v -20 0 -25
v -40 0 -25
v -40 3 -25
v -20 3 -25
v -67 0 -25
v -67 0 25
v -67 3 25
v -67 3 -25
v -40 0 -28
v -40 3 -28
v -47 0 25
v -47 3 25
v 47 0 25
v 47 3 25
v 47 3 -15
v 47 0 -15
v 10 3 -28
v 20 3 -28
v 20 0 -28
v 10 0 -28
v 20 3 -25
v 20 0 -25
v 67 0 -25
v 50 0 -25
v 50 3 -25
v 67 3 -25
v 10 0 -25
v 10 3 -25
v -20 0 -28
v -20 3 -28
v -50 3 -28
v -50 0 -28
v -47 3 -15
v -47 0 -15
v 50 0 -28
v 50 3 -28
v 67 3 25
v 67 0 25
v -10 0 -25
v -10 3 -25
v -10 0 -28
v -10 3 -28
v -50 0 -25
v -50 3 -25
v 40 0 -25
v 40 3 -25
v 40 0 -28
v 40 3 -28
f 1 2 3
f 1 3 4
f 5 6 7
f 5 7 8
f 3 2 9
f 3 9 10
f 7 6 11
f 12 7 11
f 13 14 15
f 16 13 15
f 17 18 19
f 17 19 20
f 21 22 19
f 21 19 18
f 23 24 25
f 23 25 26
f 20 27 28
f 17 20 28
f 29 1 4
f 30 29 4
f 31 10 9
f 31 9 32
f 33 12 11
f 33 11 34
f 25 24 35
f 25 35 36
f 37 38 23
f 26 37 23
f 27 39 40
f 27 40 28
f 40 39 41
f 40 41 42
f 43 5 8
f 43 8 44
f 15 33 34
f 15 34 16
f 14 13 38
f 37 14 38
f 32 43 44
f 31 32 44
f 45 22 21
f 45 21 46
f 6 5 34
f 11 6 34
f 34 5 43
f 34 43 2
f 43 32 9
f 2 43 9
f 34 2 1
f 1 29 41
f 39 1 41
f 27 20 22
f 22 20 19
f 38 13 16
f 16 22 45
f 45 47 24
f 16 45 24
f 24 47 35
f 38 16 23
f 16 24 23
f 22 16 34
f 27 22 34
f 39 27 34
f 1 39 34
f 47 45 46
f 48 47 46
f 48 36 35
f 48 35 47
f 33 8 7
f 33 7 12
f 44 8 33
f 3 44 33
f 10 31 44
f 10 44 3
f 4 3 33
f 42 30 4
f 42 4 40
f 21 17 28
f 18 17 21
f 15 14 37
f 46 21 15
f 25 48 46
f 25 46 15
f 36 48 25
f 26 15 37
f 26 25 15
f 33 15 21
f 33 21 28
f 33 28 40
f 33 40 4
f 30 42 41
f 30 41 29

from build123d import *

# Parameters (mm, degrees)
SKETCH1_W           = 134
SKETCH1_H           = 50
BOSS_EXTRUDE1_DEPTH = 3
SKETCH2_W           = 94
SKETCH2_H           = 40
CUT_EXTRUDE1_DEPTH  = 13
SKETCH3_W           = 10
SKETCH3_H           = 3
BOSS_EXTRUDE2_DEPTH = 3


with BuildPart() as part:
    # Sketch1 → Boss-Extrude1 (new body)
    with BuildSketch(Plane(origin=(0, 0, 0), x_dir=(1, 0, 0), z_dir=(0, 1, 0))):
        Rectangle(SKETCH1_W, SKETCH1_H)
    extrude(amount=BOSS_EXTRUDE1_DEPTH)

    # Sketch2 → Cut-Extrude1 (cut)
    with BuildSketch(Plane(origin=(0, 3, 0), x_dir=(1, 0, 0), z_dir=(0, 1, 0))):
        with Locations((0, -5)):
            Rectangle(SKETCH2_W, SKETCH2_H)
    extrude(amount=-CUT_EXTRUDE1_DEPTH, mode=Mode.SUBTRACT)

    # Sketch3 → Boss-Extrude2 (add)
    with BuildSketch(Plane(origin=(0, 0, -25), x_dir=(-1, 0, 0), z_dir=(0, 0, -1))):
        with Locations((-45, 1.5)):
            Rectangle(SKETCH3_W, SKETCH3_H)
        with Locations((-15, 1.5)):
            Rectangle(SKETCH3_W, SKETCH3_H)
        with Locations((15, 1.5)):
            Rectangle(SKETCH3_W, SKETCH3_H)
        with Locations((45, 1.5)):
            Rectangle(SKETCH3_W, SKETCH3_H)
    extrude(amount=BOSS_EXTRUDE2_DEPTH)


solid = part.part
